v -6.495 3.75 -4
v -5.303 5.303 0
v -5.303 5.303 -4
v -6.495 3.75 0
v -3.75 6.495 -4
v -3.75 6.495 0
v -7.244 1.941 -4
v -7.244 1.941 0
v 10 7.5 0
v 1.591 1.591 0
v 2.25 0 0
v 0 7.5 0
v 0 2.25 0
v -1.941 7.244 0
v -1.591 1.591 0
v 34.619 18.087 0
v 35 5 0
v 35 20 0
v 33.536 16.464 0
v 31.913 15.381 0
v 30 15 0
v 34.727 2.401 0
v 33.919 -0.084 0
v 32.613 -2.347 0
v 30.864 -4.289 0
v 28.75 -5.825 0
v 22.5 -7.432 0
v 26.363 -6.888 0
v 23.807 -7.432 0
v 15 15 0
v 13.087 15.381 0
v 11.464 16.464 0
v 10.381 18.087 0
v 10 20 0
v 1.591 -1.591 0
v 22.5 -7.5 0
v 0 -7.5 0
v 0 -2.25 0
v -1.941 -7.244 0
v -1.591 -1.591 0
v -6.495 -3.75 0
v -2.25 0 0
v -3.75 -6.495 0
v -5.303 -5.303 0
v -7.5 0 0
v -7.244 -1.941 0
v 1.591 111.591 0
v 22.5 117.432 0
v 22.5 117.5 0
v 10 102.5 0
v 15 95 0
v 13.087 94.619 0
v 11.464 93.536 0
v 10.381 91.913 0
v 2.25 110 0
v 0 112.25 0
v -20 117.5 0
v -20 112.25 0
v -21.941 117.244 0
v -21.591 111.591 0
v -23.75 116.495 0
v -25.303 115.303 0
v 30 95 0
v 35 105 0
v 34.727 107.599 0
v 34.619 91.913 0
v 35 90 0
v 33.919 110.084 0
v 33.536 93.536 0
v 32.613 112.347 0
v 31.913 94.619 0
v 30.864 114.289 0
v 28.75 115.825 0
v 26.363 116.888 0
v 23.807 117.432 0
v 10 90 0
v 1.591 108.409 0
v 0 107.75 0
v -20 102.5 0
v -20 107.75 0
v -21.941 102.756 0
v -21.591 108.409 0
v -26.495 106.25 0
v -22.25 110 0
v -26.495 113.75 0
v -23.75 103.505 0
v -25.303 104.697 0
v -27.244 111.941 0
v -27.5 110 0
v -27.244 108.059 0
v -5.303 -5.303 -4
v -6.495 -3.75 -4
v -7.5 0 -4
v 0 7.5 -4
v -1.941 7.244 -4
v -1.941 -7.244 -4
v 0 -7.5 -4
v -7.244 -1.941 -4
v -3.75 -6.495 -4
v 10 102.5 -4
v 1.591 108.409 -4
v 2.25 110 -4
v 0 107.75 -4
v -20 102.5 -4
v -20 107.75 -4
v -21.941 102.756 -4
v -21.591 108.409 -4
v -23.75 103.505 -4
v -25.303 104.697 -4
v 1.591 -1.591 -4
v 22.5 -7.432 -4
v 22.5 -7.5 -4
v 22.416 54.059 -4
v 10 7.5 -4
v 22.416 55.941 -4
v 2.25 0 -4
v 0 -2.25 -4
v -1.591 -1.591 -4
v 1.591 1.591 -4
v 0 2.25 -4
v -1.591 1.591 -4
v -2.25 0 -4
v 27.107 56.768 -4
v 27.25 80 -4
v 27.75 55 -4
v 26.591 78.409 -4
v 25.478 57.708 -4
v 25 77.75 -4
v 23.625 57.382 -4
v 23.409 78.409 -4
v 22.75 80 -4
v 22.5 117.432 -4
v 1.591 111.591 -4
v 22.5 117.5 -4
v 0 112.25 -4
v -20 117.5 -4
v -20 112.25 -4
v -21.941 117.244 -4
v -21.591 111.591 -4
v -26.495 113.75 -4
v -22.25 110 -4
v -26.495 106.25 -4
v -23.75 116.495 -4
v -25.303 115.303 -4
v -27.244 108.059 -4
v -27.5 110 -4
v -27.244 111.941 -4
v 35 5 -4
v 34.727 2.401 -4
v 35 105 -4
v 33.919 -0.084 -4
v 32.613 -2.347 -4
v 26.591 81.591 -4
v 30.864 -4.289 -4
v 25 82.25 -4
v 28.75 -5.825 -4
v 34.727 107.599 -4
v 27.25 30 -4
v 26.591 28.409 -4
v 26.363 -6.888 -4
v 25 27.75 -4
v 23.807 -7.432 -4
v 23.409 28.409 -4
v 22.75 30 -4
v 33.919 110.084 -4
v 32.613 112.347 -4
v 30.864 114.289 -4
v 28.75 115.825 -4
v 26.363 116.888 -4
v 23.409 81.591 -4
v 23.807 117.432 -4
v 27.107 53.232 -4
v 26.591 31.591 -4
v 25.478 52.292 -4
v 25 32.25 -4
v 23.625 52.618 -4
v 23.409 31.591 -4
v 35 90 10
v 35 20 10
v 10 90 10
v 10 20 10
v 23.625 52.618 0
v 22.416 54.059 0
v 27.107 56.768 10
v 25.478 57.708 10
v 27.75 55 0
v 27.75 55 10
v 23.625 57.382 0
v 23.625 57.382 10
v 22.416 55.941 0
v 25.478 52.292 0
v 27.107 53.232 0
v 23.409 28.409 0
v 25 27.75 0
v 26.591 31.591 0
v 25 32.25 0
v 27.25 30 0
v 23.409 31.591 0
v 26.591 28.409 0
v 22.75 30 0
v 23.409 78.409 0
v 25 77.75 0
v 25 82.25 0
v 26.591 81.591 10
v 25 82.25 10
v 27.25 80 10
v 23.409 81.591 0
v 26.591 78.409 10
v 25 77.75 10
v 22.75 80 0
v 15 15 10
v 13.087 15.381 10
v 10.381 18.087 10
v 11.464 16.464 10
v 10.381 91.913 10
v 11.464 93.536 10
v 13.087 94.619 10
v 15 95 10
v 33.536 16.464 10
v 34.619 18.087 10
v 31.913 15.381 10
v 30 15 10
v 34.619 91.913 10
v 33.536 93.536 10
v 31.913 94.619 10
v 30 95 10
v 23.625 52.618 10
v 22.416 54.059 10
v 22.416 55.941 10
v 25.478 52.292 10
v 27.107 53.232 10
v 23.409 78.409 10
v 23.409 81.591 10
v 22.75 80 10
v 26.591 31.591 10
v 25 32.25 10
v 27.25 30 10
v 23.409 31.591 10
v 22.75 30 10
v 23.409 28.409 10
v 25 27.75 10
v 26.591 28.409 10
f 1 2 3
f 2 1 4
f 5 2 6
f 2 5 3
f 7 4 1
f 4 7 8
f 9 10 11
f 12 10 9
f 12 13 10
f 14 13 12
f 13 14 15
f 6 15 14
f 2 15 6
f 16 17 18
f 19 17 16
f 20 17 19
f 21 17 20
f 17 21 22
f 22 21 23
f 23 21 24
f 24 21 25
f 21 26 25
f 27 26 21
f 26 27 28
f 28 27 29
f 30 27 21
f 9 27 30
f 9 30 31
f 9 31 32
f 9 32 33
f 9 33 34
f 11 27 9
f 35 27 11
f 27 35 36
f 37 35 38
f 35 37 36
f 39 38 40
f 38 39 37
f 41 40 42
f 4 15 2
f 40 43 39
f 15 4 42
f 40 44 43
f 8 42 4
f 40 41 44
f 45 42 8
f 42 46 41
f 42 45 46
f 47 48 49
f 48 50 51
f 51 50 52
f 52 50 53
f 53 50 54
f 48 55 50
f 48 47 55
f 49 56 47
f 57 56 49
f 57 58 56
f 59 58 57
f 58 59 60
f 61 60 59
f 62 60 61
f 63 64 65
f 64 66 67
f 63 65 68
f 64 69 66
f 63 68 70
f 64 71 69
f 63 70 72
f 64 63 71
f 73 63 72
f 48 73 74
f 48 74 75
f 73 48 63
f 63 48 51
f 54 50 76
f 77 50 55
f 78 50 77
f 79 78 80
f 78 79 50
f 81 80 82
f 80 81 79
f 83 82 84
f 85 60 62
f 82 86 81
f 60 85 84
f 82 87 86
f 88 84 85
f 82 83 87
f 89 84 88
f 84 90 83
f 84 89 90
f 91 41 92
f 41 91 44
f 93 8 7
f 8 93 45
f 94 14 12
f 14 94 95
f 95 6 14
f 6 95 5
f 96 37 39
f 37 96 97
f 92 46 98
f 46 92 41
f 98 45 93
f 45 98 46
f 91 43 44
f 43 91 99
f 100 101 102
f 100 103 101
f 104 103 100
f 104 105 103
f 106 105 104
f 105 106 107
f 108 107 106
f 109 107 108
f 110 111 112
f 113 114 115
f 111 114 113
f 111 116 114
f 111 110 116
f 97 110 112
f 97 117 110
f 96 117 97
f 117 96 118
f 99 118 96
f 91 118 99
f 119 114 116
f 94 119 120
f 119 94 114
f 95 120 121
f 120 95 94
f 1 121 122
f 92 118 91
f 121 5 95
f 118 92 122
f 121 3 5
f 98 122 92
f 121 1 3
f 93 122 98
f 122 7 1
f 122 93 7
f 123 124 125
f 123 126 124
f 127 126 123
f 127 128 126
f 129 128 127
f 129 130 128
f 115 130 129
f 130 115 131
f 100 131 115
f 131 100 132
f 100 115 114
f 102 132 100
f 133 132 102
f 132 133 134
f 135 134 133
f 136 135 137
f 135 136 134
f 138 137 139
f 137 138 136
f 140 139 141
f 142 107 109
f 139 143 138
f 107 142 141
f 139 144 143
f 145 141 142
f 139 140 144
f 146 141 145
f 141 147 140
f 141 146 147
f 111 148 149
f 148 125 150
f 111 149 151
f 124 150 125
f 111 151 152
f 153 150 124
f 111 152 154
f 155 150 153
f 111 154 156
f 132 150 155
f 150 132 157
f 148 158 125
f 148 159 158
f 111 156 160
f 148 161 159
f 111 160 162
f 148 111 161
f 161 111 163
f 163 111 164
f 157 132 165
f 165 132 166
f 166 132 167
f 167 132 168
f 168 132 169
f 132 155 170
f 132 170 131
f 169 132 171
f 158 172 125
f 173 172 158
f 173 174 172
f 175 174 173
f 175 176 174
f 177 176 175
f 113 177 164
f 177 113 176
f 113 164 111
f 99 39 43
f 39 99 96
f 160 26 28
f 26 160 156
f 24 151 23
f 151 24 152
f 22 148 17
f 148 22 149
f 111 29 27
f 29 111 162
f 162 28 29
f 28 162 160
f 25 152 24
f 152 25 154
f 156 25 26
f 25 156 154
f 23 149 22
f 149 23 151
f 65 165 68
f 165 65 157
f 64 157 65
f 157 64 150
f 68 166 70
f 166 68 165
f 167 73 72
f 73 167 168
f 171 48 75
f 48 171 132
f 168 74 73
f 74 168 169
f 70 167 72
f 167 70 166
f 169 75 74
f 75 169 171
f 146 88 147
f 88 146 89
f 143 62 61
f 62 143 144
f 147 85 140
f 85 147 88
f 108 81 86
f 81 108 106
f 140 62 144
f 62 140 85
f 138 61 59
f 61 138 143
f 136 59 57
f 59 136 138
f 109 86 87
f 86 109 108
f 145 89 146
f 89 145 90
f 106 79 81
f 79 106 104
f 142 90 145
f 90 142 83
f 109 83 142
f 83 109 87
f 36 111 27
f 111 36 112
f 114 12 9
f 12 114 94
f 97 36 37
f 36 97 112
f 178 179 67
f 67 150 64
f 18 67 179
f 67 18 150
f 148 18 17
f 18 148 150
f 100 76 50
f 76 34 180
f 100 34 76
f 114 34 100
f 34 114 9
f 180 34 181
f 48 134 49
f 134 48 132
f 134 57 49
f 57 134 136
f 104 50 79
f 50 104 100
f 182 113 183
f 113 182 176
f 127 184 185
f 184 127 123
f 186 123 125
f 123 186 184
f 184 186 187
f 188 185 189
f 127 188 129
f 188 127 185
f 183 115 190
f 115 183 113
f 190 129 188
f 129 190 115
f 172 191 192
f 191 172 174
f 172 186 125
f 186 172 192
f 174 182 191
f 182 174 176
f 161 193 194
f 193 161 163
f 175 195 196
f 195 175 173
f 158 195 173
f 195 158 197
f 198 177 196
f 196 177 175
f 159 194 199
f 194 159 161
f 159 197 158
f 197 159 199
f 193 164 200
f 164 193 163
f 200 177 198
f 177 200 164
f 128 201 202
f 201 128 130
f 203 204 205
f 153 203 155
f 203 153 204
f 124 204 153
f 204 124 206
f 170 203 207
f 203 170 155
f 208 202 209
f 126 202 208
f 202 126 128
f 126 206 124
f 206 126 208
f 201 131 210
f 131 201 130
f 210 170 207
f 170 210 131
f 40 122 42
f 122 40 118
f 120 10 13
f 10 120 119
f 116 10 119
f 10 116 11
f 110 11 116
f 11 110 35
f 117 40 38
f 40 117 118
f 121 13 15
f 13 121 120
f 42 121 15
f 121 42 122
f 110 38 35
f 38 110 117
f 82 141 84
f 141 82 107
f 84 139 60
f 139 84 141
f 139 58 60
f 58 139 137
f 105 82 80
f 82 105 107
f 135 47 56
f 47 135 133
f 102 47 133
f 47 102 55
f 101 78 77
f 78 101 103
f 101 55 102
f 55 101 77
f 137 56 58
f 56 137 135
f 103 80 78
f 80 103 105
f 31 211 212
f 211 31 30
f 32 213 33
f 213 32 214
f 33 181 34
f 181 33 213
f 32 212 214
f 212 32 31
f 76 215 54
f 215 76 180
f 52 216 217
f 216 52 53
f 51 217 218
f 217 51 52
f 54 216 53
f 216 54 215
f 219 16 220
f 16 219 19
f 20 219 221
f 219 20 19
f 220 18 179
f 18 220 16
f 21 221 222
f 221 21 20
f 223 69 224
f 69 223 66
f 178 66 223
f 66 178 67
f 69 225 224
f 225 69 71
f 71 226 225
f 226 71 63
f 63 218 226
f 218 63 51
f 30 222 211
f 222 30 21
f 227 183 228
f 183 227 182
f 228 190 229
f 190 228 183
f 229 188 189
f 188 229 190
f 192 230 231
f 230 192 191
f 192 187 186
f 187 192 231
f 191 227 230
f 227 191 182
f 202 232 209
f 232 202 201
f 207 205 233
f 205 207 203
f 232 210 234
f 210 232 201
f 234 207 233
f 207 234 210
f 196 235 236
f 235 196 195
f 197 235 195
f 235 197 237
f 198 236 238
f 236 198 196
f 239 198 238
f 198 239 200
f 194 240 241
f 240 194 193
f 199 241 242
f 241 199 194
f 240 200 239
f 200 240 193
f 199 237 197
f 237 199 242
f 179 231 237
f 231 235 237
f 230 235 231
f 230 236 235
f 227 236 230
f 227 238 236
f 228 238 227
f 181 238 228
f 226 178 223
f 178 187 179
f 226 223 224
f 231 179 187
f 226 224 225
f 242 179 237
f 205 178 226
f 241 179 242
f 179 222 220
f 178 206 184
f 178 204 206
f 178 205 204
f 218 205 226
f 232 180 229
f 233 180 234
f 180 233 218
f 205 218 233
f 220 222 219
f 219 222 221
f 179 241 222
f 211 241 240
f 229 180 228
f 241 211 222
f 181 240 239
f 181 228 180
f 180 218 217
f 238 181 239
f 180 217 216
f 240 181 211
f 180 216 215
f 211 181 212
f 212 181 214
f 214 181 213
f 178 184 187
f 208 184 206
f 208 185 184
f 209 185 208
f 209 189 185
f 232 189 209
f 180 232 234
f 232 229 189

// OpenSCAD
///////////////////////////////////////////////////////////////////////////////////
// Parts for building a 3D Printer with aluminium extrusions an makerslide parts //
//                                                                               //
//  These are simple parts for using with FreeCAD (openscad module needed.       //
//  The parts are refined inside FreeCAD                                         //
//                                                                               //
//  (c) Holger Pasligh                                                           //
//  You can use this parts for your own purpose, as long you did not sell them   //
//                                                                               //
///////////////////////////////////////////////////////////////////////////////////


// idler mount for y-axis
// mounts on makerslide, adjustable by sliding on extrusion

//vars
d_fastener = 4.5;
d_idlerscrew = 5.5;
x_slide = 20;

//output
y_idler_bottom();

//y_idler_top();

//construction

module y_idler_bottom(){
difference(){
	union(){
		translate([0,0,-4])y_idler_base();
		translate([25,55,0])y_idler_mid();
	}
	translate([0,0,10])cube([40,110,40]);
}
}


module y_idler_top(){
difference(){
	union(){
		translate([0,0,0])y_idler_base();
		translate([25,55,-40])y_idler_mid();
	}
	translate([0,0,-70])cube([40,110,40]);
	translate([0,35,0])cube([40,40,10]);
	translate([20,30,0])cube([10,50,10]);
	translate([25,55-25,-10])cylinder(d=10, h=15);
	translate([25,55+25,-10])cylinder(d=10, h=15);
}
}

module y_idler_base(){
difference(){
	union(){
		translate([0,0,0])cylinder(r=7.5, h=4);
		translate([22.5,5,0])cylinder(r=12.5, h=4);
		translate([22.5,105,0])cylinder(r=12.5, h=4);
		translate([-x_slide,110,0])cylinder(r=7.5, h=4);
		translate([0,-7.5,0])cube([22.5,15,4]);
		translate([10,5,0])cube([25,100,4]);
		translate([-x_slide,102.5,0])cube([x_slide+22.5,15,4]);
	}
	translate([25,55,-1])cylinder(d=d_idlerscrew, h=6);
	translate([25,55-25,-1])cylinder(d=d_fastener, h=6);
	translate([25,55+25,-1])cylinder(d=d_fastener, h=6);
	translate([0,0,-1])cylinder(d=d_fastener, h=6);
	translate([-x_slide,110,-1])cylinder(d=d_fastener, h=6);
	translate([0,110,-1])cylinder(d=d_fastener, h=6);
	translate([-x_slide,110-d_fastener/2,-1])cube([x_slide,d_fastener,6]);
}
}

module y_idler_mid(){
difference(){
	union(){
		translate([-10,-35,0])cylinder(r=5, h=40);
		translate([-10, 35,0])cylinder(r=5, h=40);
		translate([  5,-35,0])cylinder(r=5, h=40);
		translate([  5, 35,0])cylinder(r=5, h=40);
		translate([-15,-35,0])cube([25,70,40]);
		translate([-10,-40,0])cube([15,80,40]);
	}
	translate([0,0,-1])cylinder(d=d_idlerscrew, h=42);
	translate([0,25,-1])cylinder(d=d_fastener, h=30.8);
	translate([0,-25,-1])cylinder(d=d_fastener, h=30.8);
	translate([-4.5,27.5,16.5])cube([4,15,7]);
	translate([-16,32.5,20])rotate([0,90,0])cylinder(d=d_fastener, h=27);
}
}
